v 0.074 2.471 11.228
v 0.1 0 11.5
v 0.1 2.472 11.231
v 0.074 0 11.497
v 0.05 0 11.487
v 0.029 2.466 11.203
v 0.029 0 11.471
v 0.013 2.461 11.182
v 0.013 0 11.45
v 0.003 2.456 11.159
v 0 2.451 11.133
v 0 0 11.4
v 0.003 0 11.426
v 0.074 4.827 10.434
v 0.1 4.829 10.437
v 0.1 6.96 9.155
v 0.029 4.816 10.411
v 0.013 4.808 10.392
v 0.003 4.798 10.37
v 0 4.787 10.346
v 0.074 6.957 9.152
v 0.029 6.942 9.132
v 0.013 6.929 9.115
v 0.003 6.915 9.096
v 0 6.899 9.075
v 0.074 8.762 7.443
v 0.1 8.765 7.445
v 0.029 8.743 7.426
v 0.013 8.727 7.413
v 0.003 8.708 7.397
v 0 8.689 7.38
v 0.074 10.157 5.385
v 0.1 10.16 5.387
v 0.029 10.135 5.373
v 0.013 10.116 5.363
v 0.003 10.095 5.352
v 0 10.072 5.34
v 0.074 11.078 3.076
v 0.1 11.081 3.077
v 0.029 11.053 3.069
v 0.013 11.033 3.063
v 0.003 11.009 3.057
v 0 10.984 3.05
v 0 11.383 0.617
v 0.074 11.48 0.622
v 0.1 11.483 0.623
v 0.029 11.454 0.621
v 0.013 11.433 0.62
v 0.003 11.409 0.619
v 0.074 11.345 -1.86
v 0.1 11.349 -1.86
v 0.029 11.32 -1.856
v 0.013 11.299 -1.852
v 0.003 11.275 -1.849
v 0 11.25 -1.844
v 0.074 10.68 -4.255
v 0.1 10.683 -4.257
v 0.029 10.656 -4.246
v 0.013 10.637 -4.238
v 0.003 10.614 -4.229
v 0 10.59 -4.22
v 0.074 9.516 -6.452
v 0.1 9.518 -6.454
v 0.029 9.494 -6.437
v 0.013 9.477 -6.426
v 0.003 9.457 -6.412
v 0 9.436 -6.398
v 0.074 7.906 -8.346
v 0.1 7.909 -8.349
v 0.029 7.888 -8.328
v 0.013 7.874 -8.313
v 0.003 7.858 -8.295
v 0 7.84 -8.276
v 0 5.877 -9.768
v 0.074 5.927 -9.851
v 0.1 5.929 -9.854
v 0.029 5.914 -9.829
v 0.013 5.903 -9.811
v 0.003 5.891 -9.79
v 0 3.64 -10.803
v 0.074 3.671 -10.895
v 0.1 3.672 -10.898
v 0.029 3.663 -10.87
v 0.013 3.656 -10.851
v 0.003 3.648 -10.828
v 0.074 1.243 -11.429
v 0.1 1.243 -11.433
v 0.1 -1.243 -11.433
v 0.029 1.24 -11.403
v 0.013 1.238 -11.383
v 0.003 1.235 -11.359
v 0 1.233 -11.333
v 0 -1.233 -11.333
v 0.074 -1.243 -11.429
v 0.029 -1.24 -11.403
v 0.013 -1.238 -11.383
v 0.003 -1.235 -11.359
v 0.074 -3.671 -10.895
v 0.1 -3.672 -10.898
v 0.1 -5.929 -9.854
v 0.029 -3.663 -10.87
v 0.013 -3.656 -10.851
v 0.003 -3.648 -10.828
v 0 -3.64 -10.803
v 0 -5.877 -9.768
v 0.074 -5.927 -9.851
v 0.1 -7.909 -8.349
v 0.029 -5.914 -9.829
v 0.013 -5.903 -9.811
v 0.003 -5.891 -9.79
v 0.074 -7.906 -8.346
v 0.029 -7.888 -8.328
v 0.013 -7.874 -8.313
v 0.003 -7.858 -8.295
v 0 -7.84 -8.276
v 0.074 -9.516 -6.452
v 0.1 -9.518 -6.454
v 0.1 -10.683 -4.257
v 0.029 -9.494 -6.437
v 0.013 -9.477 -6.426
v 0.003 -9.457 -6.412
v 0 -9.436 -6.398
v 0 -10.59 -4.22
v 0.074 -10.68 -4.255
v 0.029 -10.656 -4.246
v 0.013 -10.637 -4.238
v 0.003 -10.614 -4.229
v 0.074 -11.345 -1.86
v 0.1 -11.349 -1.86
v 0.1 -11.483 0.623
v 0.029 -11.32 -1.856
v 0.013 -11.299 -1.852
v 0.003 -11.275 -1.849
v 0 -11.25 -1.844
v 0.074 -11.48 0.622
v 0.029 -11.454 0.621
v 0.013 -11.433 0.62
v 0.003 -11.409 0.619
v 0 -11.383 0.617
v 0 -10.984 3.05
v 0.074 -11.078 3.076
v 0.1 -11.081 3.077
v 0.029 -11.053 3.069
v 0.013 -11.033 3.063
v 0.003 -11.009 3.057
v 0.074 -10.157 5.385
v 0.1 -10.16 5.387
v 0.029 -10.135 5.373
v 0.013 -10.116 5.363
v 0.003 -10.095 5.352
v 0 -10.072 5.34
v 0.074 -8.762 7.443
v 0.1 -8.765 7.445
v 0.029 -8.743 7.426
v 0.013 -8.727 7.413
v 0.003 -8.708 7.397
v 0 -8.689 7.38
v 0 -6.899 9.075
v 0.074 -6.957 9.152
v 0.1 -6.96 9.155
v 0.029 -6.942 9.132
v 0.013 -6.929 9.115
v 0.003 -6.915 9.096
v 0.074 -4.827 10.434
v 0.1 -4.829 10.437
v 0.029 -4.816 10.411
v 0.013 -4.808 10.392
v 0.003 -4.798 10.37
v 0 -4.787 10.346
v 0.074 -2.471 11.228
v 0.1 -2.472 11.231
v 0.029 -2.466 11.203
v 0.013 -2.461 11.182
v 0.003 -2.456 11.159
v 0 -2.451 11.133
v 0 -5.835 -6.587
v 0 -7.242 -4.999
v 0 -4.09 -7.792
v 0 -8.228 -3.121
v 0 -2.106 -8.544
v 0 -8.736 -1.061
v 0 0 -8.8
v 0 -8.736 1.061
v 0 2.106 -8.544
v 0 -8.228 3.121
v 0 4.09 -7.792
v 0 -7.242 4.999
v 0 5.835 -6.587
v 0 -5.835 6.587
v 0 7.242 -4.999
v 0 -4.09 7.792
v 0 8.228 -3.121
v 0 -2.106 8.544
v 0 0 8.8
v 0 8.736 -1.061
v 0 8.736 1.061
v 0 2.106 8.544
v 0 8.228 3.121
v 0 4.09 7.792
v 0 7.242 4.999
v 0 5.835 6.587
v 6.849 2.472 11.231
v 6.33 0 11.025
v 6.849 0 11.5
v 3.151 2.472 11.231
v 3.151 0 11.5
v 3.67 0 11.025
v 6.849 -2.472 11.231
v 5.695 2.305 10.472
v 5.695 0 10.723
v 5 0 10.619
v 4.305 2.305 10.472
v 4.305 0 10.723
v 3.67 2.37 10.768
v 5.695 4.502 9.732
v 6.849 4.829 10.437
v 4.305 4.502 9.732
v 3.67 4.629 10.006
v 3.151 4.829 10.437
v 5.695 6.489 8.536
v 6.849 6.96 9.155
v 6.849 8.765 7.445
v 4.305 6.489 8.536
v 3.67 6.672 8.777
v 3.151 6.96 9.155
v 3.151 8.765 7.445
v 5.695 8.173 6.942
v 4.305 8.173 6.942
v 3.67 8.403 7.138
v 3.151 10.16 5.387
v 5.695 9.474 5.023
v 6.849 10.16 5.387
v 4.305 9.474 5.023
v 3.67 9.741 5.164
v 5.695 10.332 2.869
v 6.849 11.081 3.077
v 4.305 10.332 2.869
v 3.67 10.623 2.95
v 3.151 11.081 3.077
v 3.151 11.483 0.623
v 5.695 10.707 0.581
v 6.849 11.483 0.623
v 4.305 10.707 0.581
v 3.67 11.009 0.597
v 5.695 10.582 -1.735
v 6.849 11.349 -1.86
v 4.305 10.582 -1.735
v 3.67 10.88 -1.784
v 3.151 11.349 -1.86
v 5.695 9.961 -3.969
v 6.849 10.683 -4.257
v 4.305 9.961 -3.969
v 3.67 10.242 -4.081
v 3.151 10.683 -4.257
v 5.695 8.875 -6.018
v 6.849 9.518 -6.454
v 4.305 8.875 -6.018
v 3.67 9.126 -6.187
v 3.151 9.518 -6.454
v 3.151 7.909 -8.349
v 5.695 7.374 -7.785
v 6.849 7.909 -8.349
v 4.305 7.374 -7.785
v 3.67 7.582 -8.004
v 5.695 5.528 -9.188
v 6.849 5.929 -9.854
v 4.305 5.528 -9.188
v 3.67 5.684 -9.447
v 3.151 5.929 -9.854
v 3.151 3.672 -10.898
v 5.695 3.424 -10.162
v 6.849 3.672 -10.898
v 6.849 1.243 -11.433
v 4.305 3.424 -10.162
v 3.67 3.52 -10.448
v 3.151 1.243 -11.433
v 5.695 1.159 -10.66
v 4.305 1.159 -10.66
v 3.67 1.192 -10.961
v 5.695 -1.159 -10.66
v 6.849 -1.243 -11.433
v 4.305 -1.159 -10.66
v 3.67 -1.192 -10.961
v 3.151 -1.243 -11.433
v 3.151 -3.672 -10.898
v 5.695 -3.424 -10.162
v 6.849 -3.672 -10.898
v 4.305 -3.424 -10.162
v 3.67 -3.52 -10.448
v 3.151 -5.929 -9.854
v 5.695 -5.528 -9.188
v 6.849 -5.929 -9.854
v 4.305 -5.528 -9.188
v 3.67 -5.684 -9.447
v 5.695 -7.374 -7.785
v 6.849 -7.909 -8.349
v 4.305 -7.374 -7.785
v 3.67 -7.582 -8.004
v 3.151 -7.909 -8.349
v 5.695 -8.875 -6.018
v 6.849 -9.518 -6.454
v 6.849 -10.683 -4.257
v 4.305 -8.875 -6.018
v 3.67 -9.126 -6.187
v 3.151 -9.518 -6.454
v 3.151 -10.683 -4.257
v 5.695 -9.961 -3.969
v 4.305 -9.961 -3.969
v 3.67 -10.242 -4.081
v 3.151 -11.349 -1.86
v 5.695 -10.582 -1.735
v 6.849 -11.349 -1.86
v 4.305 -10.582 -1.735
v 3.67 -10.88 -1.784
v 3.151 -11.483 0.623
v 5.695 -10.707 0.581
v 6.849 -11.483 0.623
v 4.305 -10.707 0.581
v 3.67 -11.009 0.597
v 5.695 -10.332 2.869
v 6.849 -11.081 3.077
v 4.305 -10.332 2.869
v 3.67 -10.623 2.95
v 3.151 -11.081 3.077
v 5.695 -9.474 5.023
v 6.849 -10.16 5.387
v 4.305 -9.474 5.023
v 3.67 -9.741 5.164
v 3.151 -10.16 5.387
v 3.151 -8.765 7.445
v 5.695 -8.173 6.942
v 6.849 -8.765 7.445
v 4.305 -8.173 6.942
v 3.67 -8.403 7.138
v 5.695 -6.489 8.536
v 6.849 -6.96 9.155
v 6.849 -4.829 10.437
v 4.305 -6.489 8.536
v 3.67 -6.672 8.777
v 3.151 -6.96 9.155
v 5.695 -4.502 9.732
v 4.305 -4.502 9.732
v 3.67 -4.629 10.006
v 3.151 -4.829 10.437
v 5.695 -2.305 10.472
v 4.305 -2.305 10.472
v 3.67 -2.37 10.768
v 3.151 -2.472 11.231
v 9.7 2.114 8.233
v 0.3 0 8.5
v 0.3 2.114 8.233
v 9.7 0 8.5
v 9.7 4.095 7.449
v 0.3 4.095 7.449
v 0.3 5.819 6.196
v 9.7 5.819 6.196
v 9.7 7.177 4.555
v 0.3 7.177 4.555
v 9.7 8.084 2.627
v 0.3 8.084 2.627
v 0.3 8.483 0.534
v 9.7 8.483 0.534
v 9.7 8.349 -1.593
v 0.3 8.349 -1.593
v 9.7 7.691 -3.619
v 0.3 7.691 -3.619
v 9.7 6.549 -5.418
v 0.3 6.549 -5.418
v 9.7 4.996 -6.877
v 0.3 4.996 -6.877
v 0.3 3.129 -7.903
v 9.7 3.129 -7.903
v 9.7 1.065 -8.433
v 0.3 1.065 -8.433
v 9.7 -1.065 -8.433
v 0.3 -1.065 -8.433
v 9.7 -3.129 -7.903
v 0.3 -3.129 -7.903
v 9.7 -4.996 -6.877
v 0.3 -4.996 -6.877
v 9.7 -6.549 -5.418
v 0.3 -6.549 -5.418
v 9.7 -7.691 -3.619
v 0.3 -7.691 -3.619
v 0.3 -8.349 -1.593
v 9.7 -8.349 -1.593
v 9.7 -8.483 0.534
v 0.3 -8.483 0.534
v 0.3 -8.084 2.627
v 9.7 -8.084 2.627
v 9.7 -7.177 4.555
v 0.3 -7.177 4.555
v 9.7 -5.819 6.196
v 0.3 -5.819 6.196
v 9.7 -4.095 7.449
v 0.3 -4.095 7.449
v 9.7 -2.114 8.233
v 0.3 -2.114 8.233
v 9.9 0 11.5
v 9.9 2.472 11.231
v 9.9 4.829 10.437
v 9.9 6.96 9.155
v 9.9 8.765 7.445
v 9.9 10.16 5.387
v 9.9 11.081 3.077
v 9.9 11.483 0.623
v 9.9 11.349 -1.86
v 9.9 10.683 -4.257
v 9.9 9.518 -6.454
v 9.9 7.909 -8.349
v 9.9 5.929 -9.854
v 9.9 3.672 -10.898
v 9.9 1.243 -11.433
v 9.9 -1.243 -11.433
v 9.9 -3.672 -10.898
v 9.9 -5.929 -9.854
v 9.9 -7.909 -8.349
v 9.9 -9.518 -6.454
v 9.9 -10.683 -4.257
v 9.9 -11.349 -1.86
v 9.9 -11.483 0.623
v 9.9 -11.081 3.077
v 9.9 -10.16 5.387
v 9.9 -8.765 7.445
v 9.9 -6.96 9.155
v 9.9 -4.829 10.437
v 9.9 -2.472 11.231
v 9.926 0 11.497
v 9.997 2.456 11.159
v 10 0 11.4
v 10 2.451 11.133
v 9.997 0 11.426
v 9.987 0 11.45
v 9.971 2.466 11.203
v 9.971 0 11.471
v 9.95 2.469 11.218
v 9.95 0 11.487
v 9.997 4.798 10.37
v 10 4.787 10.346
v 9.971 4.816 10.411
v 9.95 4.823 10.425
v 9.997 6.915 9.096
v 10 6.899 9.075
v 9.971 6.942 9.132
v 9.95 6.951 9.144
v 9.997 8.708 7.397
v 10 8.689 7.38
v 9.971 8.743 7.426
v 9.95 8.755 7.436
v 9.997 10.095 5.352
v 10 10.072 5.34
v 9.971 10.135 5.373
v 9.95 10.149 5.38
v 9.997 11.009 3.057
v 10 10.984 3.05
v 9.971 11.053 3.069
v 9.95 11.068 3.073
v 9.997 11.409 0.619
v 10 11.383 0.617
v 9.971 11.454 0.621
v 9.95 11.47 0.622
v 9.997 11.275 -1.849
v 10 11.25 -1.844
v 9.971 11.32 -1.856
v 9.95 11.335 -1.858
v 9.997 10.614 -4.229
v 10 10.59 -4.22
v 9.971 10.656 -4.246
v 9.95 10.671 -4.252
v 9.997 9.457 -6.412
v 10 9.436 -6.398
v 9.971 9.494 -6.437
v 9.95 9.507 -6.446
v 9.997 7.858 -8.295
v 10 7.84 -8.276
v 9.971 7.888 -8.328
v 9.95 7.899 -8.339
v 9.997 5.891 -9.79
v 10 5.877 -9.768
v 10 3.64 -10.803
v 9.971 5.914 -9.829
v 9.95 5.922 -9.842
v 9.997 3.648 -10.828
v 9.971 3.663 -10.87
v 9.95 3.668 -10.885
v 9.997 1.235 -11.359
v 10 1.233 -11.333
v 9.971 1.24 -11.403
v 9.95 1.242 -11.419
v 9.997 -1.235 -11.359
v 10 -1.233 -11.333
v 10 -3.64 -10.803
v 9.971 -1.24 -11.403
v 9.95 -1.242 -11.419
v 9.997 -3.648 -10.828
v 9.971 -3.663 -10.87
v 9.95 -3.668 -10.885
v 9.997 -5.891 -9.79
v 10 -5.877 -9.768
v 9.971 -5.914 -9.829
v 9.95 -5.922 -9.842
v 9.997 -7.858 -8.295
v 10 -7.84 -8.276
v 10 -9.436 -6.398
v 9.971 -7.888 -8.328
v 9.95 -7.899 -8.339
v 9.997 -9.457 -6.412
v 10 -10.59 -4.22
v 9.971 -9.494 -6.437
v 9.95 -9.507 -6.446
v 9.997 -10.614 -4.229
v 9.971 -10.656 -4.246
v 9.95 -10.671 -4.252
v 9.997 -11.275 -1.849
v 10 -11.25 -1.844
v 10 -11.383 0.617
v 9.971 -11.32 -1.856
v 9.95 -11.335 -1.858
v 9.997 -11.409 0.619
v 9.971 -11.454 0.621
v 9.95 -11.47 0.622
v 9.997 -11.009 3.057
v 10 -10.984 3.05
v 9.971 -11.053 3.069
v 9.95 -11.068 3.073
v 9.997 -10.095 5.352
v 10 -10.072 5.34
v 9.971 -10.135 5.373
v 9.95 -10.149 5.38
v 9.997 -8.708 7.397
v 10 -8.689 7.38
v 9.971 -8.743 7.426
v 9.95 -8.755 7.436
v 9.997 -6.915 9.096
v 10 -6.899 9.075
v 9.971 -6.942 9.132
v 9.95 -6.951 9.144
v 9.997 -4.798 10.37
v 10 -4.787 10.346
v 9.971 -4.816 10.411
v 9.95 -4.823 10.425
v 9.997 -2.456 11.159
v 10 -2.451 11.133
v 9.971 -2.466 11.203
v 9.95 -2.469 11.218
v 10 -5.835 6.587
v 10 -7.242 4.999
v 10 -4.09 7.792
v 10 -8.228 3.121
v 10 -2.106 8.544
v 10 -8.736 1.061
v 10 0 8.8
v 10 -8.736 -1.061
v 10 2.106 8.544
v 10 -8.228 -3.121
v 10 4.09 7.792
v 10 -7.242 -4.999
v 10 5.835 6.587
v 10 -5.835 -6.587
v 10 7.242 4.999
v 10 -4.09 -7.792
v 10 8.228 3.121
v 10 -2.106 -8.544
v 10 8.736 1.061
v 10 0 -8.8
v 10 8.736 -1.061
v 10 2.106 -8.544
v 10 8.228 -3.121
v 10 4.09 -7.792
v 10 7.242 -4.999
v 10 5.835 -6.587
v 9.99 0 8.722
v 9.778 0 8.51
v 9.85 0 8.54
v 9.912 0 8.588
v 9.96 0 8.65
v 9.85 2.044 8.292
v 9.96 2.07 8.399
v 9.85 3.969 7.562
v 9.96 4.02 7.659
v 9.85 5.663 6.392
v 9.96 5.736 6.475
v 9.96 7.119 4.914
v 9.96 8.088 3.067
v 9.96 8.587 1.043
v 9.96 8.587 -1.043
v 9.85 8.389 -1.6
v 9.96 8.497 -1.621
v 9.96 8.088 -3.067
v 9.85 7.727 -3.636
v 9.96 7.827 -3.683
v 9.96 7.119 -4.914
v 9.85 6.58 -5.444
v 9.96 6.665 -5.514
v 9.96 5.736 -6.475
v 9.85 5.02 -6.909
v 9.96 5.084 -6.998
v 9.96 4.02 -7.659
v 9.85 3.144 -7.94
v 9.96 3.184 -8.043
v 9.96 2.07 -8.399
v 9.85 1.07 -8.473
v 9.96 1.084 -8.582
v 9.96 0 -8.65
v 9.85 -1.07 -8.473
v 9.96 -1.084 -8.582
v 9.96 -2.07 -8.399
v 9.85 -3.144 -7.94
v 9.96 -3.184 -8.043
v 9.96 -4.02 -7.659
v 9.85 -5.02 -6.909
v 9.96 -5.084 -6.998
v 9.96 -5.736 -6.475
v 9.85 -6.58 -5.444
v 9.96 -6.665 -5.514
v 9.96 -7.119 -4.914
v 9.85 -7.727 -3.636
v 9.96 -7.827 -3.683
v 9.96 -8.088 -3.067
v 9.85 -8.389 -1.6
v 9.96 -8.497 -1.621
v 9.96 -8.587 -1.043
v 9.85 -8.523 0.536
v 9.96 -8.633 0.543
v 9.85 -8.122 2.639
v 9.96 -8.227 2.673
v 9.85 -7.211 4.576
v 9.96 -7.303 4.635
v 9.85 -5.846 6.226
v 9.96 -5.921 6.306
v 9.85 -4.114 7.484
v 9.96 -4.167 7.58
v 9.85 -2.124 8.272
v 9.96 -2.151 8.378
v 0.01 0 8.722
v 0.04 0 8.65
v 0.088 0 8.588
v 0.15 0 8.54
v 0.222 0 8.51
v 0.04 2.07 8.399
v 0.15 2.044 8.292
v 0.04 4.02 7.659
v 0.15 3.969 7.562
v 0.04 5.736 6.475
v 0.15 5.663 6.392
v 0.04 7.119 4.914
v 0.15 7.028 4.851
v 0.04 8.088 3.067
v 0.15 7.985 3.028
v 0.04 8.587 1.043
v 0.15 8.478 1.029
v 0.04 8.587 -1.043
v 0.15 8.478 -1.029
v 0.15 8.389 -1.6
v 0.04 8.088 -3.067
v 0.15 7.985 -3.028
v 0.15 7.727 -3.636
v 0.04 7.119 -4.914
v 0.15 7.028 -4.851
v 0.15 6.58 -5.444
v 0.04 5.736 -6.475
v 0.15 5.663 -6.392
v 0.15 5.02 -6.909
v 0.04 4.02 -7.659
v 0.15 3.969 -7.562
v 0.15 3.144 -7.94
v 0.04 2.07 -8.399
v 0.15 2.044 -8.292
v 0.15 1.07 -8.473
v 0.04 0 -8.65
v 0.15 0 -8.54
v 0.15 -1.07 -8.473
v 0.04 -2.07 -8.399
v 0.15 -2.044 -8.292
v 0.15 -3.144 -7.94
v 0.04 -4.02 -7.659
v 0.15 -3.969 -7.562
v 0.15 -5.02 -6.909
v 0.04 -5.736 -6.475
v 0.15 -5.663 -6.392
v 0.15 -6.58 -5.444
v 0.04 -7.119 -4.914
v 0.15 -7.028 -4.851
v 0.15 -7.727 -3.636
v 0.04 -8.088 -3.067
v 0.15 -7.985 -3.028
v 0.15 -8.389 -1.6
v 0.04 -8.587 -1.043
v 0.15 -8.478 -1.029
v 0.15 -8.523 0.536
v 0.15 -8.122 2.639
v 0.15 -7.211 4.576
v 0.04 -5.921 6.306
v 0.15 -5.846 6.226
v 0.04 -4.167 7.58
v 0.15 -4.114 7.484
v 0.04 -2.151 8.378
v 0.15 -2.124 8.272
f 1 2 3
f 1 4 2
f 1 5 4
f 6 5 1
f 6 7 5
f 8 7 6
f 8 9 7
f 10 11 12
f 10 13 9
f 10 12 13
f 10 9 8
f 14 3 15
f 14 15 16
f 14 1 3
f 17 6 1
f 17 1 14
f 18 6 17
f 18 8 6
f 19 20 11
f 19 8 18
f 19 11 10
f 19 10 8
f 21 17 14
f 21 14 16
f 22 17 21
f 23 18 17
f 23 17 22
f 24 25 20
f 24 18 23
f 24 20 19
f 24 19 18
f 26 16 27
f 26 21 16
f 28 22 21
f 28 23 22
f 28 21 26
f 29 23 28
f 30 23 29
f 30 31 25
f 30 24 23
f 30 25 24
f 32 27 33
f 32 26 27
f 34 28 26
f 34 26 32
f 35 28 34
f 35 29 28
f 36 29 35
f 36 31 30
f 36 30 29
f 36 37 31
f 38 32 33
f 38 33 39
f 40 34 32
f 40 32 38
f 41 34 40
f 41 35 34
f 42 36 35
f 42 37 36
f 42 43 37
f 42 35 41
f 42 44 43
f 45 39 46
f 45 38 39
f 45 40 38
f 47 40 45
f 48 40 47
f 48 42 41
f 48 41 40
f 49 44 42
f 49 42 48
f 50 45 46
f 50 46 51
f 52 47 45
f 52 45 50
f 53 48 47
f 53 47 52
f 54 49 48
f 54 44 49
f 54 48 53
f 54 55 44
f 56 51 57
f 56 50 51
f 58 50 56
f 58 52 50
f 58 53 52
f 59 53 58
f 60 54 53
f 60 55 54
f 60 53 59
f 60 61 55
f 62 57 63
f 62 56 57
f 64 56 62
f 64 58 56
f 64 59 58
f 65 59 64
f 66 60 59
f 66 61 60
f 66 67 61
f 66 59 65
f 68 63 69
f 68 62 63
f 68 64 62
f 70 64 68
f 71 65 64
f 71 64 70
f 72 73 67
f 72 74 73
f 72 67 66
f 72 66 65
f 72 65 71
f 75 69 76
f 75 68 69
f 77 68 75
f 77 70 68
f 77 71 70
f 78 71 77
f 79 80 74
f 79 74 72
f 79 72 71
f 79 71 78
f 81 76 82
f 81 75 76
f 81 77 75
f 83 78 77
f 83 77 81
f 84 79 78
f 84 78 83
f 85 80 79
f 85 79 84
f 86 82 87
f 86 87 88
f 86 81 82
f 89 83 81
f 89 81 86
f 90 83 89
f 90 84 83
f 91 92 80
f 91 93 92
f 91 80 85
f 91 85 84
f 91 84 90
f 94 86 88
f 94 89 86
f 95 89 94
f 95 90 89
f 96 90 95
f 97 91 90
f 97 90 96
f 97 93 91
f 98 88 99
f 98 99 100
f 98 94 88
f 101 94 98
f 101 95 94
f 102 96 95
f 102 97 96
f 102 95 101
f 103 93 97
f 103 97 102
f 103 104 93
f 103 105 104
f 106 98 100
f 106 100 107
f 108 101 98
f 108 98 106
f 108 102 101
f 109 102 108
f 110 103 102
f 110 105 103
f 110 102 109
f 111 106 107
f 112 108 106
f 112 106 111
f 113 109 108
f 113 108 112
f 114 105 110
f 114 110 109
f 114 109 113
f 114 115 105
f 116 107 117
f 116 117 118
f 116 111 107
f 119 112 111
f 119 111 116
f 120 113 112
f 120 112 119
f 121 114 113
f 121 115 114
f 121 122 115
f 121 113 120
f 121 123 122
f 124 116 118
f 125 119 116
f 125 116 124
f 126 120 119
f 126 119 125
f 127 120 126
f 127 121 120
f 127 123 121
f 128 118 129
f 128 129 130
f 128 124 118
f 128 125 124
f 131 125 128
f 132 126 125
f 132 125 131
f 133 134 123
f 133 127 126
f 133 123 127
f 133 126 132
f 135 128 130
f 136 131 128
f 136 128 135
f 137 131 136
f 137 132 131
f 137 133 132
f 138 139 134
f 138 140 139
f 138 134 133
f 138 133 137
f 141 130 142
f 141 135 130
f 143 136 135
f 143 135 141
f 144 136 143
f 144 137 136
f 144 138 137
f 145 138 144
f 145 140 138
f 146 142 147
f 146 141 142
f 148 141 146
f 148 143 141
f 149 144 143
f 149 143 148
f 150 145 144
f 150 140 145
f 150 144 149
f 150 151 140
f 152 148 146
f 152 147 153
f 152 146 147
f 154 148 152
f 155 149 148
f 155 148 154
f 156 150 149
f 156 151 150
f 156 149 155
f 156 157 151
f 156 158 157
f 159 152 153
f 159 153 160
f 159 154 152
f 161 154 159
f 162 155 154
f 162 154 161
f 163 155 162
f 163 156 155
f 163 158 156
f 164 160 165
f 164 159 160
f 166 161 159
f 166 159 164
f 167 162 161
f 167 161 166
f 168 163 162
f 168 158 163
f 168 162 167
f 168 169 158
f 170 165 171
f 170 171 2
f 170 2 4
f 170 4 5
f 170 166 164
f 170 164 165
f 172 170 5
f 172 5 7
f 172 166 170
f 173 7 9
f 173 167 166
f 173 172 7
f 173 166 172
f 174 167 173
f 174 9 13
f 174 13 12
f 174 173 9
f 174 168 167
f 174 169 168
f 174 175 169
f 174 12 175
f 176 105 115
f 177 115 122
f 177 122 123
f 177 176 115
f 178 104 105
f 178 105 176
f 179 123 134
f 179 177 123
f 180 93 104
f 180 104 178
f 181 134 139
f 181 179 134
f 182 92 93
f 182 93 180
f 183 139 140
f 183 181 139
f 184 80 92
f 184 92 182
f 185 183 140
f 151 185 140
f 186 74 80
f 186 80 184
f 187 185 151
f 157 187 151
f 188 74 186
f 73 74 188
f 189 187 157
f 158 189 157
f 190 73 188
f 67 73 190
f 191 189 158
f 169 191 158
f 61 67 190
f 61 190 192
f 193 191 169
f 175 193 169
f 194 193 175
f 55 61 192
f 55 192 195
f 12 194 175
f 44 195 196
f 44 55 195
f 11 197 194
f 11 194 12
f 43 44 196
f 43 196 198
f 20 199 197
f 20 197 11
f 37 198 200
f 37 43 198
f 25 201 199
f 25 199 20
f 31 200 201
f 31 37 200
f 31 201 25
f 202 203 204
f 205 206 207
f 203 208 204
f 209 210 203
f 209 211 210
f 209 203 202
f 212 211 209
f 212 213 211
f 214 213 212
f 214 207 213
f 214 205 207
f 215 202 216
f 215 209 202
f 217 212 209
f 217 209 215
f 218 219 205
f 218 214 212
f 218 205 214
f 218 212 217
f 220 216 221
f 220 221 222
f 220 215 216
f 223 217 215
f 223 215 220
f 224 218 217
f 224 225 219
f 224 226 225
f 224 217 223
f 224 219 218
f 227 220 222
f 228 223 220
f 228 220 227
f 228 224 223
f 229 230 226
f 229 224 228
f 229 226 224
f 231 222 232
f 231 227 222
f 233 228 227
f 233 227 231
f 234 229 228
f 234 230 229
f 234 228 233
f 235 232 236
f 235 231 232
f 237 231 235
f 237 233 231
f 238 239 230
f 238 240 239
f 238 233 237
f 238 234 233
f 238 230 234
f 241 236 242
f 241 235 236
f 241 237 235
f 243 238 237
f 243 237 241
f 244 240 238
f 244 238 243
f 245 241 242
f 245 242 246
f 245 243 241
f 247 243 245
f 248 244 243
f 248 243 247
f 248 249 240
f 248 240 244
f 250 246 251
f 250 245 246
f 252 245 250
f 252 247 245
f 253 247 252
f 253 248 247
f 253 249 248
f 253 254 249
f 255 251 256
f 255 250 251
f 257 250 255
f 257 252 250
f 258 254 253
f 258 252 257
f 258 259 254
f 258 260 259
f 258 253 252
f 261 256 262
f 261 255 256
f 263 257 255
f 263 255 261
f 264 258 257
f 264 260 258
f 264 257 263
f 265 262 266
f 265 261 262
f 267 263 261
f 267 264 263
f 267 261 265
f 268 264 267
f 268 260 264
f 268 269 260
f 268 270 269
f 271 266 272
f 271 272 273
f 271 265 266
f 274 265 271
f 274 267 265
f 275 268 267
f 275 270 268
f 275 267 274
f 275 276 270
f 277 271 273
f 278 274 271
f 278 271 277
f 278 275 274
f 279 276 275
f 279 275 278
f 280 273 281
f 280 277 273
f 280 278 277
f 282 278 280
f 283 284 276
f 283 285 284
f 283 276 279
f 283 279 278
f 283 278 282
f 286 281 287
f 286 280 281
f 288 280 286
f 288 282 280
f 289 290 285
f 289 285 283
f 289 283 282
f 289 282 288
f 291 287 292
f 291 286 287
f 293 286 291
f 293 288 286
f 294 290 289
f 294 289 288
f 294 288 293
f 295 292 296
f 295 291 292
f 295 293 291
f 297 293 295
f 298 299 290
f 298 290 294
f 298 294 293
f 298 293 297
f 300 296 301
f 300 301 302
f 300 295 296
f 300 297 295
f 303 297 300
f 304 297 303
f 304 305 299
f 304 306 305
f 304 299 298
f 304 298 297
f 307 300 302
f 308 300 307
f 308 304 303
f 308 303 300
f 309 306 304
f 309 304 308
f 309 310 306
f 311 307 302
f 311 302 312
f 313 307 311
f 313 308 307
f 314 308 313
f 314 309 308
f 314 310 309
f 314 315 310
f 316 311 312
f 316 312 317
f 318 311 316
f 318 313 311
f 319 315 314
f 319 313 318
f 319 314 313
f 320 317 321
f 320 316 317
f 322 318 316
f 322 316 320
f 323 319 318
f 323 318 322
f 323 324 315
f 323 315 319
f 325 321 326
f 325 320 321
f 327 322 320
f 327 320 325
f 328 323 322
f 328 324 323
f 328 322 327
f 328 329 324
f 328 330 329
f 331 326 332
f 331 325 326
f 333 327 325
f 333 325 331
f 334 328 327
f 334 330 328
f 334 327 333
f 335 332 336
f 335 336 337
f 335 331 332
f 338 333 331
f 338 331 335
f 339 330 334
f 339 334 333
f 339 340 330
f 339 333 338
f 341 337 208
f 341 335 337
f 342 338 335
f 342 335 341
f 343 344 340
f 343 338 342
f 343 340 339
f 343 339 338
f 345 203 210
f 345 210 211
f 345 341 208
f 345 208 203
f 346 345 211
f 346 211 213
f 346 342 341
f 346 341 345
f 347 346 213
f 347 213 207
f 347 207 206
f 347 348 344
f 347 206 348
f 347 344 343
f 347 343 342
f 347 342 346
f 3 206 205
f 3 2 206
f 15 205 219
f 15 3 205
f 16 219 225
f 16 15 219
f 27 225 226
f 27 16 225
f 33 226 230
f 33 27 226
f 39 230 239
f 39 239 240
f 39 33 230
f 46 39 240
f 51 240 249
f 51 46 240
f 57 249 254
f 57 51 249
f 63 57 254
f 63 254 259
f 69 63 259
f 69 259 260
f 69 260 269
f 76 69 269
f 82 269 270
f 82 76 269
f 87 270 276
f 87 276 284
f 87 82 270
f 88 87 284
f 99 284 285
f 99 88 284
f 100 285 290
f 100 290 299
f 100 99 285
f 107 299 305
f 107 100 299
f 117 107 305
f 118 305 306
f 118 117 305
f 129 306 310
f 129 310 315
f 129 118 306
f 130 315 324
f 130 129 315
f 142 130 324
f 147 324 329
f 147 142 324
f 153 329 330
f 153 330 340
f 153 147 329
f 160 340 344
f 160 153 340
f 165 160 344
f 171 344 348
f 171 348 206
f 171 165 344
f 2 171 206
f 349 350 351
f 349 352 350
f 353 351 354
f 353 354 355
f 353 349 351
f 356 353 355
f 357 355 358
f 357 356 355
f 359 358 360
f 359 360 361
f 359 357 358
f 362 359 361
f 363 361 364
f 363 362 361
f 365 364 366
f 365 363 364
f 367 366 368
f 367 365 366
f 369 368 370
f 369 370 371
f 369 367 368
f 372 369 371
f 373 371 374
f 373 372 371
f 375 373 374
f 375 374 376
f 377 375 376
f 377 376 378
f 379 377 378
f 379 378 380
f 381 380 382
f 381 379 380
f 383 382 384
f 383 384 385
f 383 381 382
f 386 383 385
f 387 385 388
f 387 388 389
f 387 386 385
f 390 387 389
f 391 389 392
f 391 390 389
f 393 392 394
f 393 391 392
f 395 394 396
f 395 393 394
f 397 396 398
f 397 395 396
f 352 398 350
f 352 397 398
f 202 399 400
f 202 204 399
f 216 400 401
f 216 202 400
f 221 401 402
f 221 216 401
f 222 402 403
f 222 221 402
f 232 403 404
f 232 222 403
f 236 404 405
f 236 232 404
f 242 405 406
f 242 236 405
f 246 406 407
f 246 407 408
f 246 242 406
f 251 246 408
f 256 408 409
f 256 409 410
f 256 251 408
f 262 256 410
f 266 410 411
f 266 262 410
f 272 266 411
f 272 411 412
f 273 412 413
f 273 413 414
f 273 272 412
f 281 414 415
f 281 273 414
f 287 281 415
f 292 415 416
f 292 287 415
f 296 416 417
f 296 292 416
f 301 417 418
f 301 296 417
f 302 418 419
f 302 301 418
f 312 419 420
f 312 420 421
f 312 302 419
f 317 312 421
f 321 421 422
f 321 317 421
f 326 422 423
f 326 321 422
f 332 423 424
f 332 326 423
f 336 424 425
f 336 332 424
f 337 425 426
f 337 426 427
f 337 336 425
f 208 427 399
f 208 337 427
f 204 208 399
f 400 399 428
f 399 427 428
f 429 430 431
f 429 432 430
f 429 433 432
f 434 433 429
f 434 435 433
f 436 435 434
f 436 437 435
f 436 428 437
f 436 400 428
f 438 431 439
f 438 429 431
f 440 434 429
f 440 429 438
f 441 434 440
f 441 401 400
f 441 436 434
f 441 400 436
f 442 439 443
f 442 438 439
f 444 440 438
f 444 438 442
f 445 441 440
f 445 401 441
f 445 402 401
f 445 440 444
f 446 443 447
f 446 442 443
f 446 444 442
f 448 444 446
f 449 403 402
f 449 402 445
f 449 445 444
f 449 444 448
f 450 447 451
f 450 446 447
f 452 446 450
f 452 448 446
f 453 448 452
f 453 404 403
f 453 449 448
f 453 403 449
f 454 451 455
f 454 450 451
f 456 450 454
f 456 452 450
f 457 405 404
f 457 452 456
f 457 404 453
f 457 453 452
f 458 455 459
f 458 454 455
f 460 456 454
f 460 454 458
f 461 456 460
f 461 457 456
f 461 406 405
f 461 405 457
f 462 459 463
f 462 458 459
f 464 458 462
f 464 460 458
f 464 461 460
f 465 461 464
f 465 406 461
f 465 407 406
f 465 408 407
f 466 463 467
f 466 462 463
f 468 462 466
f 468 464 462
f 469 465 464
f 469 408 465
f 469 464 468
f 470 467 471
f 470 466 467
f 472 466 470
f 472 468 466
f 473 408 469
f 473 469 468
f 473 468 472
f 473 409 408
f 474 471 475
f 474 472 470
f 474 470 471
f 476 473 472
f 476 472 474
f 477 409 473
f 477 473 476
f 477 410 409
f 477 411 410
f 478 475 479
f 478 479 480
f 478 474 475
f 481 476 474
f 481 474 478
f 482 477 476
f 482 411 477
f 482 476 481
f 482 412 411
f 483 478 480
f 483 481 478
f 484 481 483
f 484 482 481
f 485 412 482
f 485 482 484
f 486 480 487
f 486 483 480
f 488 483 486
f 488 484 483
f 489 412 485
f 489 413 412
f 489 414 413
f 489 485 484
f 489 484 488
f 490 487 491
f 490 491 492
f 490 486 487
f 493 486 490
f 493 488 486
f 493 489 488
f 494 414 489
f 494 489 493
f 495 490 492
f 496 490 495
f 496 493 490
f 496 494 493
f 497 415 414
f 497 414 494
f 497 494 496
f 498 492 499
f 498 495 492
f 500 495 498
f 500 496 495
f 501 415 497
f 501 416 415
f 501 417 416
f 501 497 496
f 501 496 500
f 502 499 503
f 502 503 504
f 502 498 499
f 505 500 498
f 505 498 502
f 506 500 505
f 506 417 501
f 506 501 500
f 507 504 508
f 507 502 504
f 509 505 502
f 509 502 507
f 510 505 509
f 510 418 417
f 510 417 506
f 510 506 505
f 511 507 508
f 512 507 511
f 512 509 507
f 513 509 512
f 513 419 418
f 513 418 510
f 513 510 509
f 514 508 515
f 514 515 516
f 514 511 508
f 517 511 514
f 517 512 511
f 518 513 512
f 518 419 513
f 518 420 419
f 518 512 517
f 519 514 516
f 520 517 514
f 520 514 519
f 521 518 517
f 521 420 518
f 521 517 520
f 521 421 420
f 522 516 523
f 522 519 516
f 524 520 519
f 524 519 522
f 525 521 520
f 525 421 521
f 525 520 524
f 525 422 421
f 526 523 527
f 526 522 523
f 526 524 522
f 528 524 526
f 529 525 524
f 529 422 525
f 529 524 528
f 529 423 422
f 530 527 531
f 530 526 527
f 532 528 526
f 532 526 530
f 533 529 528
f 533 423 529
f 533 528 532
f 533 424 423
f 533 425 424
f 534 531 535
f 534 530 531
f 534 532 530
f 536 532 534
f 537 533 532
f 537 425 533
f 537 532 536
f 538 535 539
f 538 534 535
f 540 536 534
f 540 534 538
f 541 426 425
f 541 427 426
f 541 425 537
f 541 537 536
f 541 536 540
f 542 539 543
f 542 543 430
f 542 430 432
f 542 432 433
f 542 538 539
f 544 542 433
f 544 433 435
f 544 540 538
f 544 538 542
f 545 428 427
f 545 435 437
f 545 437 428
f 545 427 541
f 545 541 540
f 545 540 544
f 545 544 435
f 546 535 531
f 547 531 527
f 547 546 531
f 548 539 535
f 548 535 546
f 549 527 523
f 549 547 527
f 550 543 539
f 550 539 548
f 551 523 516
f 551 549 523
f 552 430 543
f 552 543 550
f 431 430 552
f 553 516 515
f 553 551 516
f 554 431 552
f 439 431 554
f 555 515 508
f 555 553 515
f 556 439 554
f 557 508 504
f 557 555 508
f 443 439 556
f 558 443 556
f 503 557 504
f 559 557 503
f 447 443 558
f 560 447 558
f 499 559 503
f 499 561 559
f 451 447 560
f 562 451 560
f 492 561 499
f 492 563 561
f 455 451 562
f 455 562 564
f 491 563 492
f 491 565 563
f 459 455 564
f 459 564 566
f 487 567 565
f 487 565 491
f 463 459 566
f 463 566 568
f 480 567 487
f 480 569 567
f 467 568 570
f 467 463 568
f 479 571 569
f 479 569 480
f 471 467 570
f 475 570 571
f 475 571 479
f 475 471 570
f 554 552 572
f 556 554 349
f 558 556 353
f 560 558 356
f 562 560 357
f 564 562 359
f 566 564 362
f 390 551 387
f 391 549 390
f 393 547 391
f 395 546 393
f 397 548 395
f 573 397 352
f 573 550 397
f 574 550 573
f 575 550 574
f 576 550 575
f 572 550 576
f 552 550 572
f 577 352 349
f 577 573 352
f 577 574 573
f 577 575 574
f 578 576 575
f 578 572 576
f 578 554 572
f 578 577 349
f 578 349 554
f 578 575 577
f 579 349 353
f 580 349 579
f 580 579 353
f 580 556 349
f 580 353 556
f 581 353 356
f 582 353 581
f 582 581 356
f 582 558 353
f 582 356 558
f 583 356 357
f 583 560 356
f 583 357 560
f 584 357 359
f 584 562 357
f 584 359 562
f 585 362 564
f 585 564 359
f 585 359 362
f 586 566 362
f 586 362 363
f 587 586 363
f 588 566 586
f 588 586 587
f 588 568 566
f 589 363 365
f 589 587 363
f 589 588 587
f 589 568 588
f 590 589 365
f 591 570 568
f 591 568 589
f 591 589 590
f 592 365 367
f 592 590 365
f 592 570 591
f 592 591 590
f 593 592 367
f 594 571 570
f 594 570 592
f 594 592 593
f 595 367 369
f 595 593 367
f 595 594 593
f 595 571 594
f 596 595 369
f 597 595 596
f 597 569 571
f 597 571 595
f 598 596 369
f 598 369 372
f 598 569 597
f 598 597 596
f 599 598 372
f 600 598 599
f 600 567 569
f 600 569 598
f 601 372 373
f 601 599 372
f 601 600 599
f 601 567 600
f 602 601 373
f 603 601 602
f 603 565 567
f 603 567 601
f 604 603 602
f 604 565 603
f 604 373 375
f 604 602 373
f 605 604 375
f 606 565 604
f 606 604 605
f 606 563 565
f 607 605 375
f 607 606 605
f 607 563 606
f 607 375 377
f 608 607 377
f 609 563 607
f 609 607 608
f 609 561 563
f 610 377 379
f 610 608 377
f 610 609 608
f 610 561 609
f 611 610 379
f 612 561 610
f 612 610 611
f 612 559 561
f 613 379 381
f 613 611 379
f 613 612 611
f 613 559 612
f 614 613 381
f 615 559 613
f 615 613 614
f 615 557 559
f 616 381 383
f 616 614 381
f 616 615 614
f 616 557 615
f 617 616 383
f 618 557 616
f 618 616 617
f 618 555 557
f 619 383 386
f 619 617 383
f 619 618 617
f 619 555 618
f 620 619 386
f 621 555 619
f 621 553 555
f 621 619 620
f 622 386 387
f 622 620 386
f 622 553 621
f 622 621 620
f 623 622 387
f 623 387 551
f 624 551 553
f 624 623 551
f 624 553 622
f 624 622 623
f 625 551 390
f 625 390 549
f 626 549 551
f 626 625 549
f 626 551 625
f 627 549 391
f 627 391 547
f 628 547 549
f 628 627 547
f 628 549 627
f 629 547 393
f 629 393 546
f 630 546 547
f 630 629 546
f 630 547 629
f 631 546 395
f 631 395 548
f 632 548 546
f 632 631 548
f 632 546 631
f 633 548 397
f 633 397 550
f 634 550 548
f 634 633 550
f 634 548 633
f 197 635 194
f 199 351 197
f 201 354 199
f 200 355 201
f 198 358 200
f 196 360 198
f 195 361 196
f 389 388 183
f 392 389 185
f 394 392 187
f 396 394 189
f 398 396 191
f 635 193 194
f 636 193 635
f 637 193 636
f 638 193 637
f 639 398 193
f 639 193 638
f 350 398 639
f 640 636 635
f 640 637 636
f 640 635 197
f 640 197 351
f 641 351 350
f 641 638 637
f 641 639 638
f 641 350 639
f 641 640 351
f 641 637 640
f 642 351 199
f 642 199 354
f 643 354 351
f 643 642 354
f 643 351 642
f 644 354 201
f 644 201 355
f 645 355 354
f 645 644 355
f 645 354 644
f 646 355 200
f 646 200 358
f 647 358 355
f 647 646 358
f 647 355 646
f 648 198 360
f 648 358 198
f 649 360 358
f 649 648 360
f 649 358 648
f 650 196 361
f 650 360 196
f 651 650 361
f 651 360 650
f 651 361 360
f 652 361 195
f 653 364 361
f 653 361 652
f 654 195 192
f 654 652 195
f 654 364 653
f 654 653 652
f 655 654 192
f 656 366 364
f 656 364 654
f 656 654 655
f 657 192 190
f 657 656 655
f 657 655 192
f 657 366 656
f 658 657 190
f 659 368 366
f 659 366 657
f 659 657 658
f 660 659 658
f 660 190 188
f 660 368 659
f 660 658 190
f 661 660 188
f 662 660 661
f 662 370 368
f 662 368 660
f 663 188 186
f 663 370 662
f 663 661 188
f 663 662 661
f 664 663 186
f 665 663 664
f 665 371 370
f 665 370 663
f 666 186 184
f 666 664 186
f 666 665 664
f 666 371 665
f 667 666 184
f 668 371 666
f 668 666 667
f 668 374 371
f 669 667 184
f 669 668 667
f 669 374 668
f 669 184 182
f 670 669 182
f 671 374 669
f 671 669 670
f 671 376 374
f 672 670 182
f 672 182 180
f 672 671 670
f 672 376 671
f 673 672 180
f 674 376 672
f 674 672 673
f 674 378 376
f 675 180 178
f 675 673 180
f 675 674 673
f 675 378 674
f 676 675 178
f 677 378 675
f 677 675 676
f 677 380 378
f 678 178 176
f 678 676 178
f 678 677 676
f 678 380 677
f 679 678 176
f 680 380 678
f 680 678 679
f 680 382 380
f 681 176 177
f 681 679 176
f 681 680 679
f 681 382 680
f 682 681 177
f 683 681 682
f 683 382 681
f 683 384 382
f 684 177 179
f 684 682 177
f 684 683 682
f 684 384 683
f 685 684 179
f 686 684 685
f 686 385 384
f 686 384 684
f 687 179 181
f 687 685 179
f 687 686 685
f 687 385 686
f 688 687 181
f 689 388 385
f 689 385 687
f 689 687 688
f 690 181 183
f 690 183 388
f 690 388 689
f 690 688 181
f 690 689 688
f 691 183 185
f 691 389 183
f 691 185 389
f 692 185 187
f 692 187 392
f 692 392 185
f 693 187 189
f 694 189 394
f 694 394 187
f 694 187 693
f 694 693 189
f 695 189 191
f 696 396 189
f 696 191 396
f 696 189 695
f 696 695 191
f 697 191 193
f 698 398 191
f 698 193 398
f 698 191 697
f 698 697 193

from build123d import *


with BuildPart() as part:
    # Esquisse1 → Révolution1 (revolve)
    with BuildSketch(Plane.XY, mode=Mode.PRIVATE) as r_volution1_sk:
        with BuildLine():
            Line((0.3, 8.5), (9.7, 8.5))
            ThreePointArc((9.7, 8.5), (9.912132034, 8.587867966), (10, 8.8))
            Line((10, 8.8), (10, 11.4))
            ThreePointArc((10, 11.4), (9.970710678, 11.470710678), (9.9, 11.5))
            Line((9.9, 11.5), (6.849097347, 11.5))
            ThreePointArc((6.849097347, 11.5), (5, 10.619), (3.150902653, 11.5))
            Line((3.150902653, 11.5), (0.1, 11.5))
            ThreePointArc((0.1, 11.5), (0.029289322, 11.470710678), (0, 11.4))
            Line((0, 11.4), (0, 8.8))
            ThreePointArc((0, 8.8), (0.087867966, 8.587867966), (0.3, 8.5))
        make_face()
    revolve(r_volution1_sk.sketch.rotate(Axis((100, 0, 0), (-1, 0, 0)), 270), axis=Axis((100, 0, 0), (-1, 0, 0)))


solid = part.part
